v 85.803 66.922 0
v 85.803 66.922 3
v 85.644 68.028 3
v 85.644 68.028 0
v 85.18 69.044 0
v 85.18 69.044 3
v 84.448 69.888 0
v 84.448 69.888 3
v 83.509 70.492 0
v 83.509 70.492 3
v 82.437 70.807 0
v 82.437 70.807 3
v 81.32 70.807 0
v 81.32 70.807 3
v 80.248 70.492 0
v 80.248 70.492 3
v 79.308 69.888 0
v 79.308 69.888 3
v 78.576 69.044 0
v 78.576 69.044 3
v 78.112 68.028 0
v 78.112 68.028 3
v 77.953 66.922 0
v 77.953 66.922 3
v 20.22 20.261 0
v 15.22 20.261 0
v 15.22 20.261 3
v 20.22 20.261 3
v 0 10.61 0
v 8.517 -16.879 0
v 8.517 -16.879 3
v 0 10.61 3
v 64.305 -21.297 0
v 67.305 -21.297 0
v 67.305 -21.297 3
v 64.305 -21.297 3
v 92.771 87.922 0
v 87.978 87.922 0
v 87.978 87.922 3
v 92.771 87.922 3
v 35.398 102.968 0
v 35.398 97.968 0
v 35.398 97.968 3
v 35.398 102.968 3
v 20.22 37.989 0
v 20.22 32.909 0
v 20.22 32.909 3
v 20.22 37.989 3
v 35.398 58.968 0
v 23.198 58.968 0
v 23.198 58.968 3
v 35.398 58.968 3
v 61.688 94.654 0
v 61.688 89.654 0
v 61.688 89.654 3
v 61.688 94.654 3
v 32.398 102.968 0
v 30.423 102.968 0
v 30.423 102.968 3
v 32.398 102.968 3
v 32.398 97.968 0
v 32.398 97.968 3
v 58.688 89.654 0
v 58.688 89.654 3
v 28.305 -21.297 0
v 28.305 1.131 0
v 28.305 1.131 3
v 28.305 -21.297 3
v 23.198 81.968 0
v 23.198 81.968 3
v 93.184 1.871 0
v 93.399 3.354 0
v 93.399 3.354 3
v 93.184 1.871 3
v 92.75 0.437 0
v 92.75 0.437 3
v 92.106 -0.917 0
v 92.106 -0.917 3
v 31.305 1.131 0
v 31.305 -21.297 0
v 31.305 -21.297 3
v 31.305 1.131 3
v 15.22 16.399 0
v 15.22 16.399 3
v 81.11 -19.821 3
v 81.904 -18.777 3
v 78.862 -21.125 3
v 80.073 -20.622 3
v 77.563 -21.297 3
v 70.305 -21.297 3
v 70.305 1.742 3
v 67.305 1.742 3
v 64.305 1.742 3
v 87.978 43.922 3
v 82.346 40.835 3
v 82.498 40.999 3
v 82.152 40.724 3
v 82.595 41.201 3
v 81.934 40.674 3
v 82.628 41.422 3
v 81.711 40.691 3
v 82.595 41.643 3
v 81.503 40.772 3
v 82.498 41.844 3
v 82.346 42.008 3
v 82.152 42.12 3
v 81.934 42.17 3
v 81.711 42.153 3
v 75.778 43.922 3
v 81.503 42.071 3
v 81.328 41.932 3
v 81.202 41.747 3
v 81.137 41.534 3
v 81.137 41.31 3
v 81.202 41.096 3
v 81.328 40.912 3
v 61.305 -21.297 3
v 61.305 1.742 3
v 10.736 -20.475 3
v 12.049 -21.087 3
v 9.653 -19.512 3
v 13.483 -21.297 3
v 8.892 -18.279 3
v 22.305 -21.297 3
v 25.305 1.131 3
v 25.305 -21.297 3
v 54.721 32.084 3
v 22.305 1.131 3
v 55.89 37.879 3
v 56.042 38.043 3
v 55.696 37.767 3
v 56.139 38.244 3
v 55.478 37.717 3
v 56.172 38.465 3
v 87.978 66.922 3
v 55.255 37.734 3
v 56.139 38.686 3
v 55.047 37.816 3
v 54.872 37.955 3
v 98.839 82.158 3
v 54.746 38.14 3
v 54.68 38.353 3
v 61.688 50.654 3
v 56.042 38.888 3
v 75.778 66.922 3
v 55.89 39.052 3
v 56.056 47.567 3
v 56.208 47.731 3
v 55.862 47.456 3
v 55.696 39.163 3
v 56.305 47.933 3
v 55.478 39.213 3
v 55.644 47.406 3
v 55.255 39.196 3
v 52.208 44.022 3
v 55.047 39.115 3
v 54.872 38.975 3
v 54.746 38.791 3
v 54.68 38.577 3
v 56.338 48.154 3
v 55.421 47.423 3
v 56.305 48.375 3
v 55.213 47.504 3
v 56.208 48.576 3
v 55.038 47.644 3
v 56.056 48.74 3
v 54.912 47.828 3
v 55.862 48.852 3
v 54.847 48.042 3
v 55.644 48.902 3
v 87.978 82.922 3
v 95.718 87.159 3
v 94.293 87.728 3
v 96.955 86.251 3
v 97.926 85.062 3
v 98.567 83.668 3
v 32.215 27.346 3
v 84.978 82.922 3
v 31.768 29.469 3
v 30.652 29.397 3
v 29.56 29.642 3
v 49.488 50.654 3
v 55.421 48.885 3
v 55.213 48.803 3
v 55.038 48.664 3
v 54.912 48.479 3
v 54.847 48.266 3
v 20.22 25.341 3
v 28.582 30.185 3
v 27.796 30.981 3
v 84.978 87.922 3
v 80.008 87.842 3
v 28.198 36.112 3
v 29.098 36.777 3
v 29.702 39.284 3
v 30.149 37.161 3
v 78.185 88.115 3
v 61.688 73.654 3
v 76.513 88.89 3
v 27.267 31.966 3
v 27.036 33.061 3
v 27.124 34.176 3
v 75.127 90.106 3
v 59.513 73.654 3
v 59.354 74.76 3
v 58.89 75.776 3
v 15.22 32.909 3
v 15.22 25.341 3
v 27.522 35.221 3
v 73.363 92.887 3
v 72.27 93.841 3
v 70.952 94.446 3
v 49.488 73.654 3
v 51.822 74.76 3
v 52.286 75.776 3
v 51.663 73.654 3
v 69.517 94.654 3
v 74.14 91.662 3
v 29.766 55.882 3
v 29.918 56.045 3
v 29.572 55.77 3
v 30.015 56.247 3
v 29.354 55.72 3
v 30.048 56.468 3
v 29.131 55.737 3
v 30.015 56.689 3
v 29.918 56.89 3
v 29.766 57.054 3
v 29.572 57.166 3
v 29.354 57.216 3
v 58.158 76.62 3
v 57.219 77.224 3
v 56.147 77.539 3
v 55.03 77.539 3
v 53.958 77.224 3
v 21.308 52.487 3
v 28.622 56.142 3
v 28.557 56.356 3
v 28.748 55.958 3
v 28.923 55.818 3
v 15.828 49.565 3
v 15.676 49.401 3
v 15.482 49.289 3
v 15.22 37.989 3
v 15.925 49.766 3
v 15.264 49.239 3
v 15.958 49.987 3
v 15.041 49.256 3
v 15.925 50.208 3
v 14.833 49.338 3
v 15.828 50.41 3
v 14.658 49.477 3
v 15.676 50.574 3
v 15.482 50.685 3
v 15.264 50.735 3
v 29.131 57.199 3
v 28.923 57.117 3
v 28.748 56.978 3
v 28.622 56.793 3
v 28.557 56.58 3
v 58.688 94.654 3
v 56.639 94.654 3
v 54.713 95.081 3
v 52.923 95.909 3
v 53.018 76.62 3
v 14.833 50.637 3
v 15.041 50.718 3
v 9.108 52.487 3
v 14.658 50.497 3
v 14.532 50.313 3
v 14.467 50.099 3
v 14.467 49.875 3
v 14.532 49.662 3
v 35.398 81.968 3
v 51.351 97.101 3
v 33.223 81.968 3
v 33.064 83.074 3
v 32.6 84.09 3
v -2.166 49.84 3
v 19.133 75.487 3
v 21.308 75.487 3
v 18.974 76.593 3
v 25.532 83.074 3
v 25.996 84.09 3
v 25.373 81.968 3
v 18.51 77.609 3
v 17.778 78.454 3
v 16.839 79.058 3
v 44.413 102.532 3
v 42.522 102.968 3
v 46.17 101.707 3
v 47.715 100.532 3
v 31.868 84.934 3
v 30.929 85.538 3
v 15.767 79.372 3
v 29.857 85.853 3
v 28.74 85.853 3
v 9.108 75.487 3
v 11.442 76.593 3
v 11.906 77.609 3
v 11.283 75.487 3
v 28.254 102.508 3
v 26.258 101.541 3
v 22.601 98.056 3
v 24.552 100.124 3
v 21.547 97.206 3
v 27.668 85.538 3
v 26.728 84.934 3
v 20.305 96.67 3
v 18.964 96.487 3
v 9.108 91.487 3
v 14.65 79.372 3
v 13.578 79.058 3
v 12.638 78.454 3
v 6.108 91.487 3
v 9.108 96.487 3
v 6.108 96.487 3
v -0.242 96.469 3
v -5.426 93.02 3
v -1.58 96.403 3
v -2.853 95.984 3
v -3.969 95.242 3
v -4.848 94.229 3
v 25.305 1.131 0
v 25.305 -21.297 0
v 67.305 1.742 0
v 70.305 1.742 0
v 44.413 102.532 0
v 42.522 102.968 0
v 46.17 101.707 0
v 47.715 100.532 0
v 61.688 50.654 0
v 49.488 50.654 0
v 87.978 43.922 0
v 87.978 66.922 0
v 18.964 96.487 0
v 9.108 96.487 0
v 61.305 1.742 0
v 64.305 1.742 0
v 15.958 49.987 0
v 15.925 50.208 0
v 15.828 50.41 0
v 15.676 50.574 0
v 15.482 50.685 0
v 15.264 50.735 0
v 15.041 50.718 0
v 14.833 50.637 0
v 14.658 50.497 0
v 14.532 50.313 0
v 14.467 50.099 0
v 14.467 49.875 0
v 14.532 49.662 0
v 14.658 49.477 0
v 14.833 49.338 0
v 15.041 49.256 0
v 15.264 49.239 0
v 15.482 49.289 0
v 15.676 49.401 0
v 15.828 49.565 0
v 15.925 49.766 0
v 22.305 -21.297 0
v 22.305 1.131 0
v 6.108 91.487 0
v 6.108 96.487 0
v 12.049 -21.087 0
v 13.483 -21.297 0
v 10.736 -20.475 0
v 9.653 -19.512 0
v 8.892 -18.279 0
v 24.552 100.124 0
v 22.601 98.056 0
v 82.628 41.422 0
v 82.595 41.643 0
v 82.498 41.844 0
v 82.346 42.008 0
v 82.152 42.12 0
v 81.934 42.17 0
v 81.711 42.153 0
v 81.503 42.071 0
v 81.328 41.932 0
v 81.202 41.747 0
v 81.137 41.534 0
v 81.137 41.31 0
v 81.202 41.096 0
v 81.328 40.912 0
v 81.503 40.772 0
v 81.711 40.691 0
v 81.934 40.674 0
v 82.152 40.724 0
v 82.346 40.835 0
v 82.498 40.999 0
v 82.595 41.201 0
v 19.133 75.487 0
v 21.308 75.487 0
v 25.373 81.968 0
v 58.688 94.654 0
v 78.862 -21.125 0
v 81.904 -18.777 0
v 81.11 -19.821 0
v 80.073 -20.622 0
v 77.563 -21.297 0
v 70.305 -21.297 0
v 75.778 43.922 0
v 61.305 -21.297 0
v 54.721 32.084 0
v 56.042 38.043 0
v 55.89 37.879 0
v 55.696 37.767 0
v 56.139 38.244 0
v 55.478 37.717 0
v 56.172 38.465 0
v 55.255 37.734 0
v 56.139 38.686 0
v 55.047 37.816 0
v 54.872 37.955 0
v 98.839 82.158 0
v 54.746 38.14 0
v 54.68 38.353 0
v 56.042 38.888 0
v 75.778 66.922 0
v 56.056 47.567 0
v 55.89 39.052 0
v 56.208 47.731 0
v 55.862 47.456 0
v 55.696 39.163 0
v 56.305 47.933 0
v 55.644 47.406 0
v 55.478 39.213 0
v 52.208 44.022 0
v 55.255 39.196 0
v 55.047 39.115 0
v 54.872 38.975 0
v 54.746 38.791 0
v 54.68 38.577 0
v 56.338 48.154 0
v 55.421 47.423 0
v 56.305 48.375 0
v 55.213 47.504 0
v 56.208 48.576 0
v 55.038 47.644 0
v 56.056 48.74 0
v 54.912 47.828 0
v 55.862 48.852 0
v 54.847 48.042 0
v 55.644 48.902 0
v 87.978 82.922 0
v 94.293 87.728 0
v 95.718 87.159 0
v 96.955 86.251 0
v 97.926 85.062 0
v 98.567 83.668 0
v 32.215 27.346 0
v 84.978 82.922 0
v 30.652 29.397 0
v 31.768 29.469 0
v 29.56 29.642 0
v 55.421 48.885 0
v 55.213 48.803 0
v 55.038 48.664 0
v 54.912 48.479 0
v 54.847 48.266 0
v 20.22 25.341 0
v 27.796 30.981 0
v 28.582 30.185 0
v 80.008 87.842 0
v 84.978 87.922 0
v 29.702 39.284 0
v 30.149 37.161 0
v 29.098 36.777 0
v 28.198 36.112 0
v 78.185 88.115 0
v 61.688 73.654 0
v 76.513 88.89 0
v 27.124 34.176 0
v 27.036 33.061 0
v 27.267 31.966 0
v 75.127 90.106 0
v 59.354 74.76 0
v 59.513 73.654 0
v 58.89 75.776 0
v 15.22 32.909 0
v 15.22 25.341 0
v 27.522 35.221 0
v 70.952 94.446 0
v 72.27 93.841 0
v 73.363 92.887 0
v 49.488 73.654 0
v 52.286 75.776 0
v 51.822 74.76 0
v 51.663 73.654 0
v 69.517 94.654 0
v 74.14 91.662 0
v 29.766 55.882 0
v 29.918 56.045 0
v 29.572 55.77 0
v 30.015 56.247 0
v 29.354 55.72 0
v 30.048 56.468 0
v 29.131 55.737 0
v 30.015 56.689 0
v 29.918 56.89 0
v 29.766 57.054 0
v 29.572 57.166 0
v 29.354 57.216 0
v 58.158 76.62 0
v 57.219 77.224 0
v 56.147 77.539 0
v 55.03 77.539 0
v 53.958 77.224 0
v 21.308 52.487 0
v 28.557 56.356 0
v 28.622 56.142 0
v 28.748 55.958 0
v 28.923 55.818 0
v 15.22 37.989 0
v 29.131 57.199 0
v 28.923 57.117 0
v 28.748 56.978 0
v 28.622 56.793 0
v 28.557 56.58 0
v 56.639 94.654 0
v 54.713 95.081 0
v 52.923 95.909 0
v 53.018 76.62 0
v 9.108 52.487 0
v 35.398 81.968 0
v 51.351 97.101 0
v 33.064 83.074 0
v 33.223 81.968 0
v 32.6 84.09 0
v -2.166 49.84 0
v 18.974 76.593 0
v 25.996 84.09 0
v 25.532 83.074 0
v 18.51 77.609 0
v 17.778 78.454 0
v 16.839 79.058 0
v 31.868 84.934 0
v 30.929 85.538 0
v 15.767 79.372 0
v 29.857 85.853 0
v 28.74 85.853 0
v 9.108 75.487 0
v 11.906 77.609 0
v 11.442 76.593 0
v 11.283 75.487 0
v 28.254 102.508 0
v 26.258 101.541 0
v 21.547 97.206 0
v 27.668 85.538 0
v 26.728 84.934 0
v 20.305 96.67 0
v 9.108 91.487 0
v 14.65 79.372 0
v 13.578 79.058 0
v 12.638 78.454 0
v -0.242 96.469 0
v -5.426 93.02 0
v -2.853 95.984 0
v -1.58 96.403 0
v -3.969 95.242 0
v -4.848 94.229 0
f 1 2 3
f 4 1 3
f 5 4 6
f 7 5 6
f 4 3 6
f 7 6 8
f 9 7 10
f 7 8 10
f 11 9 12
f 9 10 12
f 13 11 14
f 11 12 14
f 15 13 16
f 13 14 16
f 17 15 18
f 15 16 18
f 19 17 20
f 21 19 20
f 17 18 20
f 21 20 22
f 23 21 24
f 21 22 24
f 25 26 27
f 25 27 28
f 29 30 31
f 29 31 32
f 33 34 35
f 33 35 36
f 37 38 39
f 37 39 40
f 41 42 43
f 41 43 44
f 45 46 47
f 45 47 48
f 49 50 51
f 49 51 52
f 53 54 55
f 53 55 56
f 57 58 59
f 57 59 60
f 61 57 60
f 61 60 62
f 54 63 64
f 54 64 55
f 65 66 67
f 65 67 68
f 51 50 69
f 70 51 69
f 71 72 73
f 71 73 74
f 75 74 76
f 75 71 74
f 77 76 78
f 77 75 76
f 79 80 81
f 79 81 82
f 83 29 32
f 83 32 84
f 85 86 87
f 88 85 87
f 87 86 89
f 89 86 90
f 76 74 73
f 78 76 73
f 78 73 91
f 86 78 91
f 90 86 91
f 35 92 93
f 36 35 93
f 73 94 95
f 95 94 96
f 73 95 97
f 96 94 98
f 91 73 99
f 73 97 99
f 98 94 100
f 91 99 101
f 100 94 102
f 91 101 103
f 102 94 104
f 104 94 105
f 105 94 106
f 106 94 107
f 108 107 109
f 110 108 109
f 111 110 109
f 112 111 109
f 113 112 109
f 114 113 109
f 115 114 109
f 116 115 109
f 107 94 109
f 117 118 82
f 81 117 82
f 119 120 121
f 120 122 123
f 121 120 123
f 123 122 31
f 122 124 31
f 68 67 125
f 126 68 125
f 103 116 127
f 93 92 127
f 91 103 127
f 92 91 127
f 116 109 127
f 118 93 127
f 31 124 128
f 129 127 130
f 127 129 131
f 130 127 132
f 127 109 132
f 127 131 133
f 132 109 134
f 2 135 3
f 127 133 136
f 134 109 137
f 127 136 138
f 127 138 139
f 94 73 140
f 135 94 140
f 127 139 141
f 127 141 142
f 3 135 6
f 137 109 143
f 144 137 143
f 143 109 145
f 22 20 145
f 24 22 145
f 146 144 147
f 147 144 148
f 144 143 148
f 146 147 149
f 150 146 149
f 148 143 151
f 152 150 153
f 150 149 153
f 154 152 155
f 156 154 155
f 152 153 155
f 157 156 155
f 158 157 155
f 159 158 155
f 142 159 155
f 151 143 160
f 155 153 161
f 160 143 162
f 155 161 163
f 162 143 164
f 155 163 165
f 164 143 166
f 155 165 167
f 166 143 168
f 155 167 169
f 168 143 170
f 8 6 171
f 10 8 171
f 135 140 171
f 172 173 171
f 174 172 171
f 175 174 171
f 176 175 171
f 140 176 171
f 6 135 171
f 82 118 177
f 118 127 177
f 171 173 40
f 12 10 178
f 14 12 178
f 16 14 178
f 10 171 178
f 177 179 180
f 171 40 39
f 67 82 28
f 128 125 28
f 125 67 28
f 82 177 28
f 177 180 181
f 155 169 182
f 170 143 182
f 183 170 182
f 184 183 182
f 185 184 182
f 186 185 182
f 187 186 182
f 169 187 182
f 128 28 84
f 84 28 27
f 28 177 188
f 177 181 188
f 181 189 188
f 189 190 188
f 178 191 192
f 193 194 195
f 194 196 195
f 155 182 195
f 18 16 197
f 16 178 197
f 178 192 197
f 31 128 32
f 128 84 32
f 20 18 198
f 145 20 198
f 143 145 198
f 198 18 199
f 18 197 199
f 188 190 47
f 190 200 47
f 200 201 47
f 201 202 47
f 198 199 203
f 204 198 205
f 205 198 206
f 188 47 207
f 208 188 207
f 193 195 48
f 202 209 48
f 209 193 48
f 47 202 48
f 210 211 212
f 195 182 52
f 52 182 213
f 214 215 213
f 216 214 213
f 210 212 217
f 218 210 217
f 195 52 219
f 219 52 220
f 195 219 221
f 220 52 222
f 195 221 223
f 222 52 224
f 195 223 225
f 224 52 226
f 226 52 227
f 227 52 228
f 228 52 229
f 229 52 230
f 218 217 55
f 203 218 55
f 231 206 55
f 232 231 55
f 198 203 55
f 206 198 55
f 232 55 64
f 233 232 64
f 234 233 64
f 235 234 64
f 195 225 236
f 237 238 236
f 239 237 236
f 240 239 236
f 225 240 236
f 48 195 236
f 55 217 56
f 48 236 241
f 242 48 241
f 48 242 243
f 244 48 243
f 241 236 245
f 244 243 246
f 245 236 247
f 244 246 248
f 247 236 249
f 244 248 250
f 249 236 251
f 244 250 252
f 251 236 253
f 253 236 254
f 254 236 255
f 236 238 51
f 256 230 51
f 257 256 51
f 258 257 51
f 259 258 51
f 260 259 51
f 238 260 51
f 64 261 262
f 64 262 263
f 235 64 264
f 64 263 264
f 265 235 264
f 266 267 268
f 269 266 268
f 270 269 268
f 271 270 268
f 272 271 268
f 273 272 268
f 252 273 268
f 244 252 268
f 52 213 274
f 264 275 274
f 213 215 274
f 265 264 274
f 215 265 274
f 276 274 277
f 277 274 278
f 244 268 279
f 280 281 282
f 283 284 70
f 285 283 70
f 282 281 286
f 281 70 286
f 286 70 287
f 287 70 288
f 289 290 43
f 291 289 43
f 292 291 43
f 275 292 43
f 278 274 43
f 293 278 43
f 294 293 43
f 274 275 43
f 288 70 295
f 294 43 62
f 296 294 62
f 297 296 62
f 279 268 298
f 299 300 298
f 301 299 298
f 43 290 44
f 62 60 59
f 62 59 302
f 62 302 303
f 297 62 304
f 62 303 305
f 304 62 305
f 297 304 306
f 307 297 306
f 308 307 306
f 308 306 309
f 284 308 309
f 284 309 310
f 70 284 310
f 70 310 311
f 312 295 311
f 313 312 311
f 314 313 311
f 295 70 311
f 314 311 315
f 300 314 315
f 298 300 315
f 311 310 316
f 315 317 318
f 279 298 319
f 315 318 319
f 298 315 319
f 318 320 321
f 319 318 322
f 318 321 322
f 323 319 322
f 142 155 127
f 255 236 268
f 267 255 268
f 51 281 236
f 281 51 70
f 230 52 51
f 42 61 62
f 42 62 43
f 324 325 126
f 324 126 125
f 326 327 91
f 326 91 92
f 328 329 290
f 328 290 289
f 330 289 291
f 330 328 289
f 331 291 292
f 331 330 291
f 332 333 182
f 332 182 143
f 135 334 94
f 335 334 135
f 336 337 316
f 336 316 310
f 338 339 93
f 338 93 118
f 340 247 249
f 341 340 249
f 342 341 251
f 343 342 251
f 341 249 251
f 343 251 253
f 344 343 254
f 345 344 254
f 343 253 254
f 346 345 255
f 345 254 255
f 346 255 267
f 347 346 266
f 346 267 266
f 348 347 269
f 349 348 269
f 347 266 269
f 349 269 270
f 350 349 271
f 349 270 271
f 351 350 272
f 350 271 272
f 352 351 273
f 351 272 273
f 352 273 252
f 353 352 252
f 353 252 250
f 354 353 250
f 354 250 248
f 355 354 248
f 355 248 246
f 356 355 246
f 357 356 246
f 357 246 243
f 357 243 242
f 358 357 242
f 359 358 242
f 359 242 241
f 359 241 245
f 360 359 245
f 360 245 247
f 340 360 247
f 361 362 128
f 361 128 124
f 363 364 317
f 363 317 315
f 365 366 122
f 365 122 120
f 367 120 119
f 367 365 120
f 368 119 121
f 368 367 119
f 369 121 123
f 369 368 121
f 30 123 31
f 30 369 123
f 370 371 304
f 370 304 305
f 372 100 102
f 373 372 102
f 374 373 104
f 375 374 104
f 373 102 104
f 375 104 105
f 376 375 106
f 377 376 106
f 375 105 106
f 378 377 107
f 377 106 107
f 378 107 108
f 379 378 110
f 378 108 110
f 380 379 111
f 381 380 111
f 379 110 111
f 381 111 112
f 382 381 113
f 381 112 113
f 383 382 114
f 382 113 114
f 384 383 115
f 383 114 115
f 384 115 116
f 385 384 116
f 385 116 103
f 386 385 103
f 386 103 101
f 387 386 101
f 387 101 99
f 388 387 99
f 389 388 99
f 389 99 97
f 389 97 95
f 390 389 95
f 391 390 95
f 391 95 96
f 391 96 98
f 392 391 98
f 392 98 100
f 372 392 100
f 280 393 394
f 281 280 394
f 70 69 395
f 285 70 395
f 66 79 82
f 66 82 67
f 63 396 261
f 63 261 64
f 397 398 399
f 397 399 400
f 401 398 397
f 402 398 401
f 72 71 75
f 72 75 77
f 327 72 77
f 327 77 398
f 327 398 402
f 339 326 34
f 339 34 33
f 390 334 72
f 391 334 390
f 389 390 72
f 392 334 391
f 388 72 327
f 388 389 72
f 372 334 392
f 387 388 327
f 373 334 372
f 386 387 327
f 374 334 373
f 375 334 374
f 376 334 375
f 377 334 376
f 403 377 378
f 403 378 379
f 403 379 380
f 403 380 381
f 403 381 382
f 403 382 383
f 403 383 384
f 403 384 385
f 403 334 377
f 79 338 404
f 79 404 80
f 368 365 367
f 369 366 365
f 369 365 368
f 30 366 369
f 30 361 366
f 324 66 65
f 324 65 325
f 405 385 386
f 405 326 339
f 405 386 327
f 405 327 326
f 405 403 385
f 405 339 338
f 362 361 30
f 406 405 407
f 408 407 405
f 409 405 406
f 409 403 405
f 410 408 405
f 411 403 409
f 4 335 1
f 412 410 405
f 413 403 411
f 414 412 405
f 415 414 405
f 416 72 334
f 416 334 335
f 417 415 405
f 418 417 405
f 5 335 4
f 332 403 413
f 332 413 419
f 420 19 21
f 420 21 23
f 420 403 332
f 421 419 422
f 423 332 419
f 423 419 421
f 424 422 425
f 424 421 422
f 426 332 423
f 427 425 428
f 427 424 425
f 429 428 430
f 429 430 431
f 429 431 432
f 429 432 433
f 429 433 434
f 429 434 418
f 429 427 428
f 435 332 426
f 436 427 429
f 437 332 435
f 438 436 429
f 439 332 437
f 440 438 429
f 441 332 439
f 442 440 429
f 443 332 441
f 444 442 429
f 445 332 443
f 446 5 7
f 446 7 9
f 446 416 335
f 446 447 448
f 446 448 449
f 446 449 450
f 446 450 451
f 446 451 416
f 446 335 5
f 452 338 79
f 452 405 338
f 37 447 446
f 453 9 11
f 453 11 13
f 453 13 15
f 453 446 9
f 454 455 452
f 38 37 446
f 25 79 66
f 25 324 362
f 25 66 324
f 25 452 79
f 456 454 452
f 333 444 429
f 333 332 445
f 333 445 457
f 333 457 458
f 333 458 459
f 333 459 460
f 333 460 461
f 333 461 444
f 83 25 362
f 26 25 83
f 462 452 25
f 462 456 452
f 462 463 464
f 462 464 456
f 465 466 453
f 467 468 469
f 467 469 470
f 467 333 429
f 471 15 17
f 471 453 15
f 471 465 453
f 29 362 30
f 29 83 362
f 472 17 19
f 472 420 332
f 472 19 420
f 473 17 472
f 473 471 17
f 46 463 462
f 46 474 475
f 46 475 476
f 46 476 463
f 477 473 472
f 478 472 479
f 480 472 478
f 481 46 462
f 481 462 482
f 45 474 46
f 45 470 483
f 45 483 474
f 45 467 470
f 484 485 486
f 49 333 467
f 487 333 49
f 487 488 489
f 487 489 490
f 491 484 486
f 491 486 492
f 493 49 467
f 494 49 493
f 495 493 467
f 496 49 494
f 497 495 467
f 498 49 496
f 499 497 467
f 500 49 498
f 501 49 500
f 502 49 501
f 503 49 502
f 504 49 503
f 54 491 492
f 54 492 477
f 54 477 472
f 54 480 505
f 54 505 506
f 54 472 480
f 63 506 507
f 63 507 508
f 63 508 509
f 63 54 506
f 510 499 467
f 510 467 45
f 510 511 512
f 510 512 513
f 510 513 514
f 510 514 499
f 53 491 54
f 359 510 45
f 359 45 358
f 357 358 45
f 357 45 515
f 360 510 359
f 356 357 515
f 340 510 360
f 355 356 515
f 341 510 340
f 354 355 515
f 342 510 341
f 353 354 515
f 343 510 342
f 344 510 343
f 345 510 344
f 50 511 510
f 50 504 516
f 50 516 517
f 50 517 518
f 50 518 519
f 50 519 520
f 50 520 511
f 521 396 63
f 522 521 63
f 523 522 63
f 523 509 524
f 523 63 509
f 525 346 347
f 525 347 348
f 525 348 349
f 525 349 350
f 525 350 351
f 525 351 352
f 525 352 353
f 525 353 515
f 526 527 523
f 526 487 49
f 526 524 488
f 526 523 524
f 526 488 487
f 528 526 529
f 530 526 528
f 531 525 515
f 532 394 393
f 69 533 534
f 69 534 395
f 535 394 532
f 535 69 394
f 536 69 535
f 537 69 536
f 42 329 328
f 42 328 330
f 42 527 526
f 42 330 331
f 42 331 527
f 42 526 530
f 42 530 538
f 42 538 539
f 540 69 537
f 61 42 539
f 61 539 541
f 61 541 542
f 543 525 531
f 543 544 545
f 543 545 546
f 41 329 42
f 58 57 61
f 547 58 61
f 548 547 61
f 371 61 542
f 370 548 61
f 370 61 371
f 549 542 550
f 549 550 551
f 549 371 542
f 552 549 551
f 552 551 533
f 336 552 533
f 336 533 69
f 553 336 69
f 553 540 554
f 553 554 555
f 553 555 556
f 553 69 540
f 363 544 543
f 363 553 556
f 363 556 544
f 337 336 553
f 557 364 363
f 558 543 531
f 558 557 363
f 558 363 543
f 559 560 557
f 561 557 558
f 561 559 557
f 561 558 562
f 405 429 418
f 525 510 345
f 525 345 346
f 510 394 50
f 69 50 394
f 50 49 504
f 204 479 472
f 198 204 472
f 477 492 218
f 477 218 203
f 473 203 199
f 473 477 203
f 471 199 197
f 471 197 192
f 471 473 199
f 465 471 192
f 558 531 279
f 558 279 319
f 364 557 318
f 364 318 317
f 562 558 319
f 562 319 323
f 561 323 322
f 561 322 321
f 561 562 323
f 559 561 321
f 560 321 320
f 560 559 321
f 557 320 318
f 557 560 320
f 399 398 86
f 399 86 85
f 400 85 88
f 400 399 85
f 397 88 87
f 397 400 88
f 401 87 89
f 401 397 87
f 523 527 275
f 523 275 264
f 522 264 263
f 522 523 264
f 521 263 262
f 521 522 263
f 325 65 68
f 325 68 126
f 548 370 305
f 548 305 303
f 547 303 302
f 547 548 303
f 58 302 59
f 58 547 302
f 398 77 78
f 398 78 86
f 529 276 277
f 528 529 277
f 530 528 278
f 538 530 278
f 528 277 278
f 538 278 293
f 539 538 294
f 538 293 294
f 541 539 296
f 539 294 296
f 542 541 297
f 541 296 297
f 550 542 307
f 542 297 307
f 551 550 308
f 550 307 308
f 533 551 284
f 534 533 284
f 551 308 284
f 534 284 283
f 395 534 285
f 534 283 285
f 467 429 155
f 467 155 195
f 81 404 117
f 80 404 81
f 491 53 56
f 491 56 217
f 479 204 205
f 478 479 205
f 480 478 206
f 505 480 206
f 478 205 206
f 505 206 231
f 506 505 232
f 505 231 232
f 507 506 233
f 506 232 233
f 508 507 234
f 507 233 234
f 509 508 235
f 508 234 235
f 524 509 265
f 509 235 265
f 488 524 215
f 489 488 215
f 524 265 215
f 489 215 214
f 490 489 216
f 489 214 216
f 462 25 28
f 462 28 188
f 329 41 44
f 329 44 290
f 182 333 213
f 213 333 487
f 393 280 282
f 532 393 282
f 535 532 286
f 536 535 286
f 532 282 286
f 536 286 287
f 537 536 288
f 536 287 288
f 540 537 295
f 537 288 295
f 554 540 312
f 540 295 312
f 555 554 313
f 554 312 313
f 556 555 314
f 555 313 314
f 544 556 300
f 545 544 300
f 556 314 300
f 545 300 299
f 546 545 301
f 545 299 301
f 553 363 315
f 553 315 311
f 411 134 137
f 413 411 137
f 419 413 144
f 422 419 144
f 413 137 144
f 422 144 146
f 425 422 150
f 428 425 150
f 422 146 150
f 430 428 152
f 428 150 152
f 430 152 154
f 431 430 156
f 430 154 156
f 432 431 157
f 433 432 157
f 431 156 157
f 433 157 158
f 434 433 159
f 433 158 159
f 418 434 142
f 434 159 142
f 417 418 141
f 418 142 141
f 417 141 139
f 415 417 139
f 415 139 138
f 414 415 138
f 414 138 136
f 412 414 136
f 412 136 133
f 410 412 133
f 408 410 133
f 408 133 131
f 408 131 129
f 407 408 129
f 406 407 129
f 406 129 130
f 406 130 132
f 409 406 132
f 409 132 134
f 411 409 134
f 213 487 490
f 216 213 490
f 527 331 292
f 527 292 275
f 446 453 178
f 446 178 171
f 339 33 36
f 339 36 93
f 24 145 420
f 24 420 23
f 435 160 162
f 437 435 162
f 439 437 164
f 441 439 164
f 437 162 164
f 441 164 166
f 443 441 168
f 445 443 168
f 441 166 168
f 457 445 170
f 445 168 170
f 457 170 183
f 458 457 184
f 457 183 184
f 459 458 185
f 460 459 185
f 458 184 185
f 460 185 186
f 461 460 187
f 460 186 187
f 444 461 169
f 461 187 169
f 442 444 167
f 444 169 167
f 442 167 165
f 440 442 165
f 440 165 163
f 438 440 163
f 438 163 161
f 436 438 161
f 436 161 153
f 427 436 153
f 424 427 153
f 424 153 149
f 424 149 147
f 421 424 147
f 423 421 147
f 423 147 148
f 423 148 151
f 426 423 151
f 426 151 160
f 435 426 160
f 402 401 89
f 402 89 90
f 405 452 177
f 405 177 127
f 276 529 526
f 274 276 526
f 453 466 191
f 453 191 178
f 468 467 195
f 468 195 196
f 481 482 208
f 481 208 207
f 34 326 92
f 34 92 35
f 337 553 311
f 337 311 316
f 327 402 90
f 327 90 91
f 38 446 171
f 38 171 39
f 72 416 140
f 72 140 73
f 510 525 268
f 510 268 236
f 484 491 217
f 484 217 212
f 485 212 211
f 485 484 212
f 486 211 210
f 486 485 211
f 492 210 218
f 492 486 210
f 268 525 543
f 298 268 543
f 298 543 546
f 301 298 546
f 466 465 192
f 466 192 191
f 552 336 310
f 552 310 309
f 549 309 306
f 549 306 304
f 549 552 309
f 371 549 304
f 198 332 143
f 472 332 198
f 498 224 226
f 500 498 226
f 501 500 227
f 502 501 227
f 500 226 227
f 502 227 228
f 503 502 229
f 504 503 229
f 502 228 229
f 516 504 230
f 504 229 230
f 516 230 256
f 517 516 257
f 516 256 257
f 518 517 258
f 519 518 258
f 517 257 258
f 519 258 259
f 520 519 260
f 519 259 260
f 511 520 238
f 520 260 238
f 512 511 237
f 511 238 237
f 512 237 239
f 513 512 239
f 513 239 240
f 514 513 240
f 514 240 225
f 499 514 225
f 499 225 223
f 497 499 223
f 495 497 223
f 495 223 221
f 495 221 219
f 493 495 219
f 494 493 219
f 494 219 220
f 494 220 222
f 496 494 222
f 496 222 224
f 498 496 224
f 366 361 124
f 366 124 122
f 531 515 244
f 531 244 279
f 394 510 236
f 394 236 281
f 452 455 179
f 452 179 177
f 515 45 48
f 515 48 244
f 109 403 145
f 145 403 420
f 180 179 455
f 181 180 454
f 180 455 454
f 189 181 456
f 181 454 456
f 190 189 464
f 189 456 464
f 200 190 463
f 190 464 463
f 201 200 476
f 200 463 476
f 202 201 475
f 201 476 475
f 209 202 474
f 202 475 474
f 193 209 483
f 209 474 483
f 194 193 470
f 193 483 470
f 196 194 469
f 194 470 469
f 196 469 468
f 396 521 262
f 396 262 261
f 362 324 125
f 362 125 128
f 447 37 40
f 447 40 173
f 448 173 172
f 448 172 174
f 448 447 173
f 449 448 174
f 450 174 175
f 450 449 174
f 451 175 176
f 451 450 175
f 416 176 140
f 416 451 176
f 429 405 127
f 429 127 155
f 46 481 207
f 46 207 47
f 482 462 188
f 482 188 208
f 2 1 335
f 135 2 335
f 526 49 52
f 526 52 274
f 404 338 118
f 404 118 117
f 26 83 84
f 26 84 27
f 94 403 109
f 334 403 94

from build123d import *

# Parameters (mm, degrees)
SKETCH1_W           = 12.2
SKETCH1_H           = 23
BOSS_EXTRUDE1_DEPTH = 3
CUT_EXTRUDE2_DEPTH  = 4
SKETCH5_R           = 3.925
CUT_EXTRUDE3_DEPTH  = 4
SKETCH6_R           = 0.75
CUT_EXTRUDE4_DEPTH  = 4
SKETCH7_R           = 3.93
SKETCH7_R_2         = 0.75
CUT_EXTRUDE5_DEPTH  = 4
SKETCH8_R           = 0.75
CUT_EXTRUDE6_DEPTH  = 4


with BuildPart() as part:
    # Sketch1 → Boss-Extrude1 (new body)
    with BuildSketch(Plane.XY):
        with BuildLine():
            Line((22.600652844, 98.055778181), (24.552064, 100.123868682))
            ThreePointArc((24.552064, 100.123868682), (27.226414403, 102.085102355), (30.423169177, 102.967908395))
            Line((30.423169177, 102.967908395), (32.3981368, 102.967908395))
            Line((32.3981368, 102.967908395), (32.3981368, 97.967908395))
            Line((32.3981368, 97.967908395), (35.3981368, 97.967908395))
            Line((35.3981368, 97.967908395), (35.3981368, 102.967908395))
            Line((35.3981368, 102.967908395), (42.521983007, 102.967908395))
            ThreePointArc((42.521983007, 102.967908395), (45.313446231, 102.166024258), (47.714614303, 100.532109635))
            Line((47.714614303, 100.532109635), (51.351246918, 97.100651749))
            ThreePointArc((51.351246918, 97.100651749), (53.795711755, 95.446564433), (56.638770897, 94.65382999))
            Line((56.638770897, 94.65382999), (58.6881368, 94.65382999))
            Line((58.6881368, 94.65382999), (58.6881368, 89.65382999))
            Line((58.6881368, 89.65382999), (61.6881368, 89.65382999))
            Line((61.6881368, 89.65382999), (61.6881368, 94.65382999))
            Line((61.6881368, 94.65382999), (69.516671711, 94.65382999))
            ThreePointArc((69.516671711, 94.65382999), (72.270221934, 93.840698694), (74.140331494, 91.662187375))
            ThreePointArc((74.140331494, 91.662187375), (76.513167022, 88.89023599), (80.008265046, 87.842212737))
            Line((80.008265046, 87.842212737), (84.9781368, 87.921834161))
            Line((84.9781368, 87.921834161), (84.9781368, 82.921834161))
            Line((84.9781368, 82.921834161), (87.9781368, 82.921834161))
            Line((87.9781368, 82.921834161), (87.9781368, 87.921834161))
            Line((87.9781368, 87.921834161), (92.770707207, 87.921834161))
            ThreePointArc((92.770707207, 87.921834161), (96.955459046, 86.251143727), (98.839013483, 82.157786039))
            Line((98.839013483, 82.157786039), (93.399435569, 3.354416739))
            ThreePointArc((93.399435569, 3.354416739), (92.994237185, 1.145679097), (92.106398089, -0.916952583))
            Line((92.106398089, -0.916952583), (81.904303792, -18.77723742))
            ThreePointArc((81.904303792, -18.77723742), (80.072671375, -20.621586038), (77.562692027, -21.297235952))
            Line((77.562692027, -21.297235952), (70.304838359, -21.297235952))
            Line((70.304838359, -21.297235952), (70.304838359, 1.741579383))
            Line((70.304838359, 1.741579383), (67.304838359, 1.741579383))
            Line((67.304838359, 1.741579383), (67.304838359, -21.297235952))
            Line((67.304838359, -21.297235952), (64.304838359, -21.297235952))
            Line((64.304838359, -21.297235952), (64.304838359, 1.741579383))
            Line((64.304838359, 1.741579383), (61.304838359, 1.741579383))
            Line((61.304838359, 1.741579383), (61.304838359, -21.297235952))
            Line((61.304838359, -21.297235952), (31.304838359, -21.297235952))
            Line((31.304838359, -21.297235952), (31.304838359, 1.130887015))
            Line((31.304838359, 1.130887015), (28.304838359, 1.130887015))
            Line((28.304838359, 1.130887015), (28.304838359, -21.297235952))
            Line((28.304838359, -21.297235952), (25.304838359, -21.297235952))
            Line((25.304838359, -21.297235952), (25.304838359, 1.130887015))
            Line((25.304838359, 1.130887015), (22.304838359, 1.130887015))
            Line((22.304838359, 1.130887015), (22.304838359, -21.297235952))
            Line((22.304838359, -21.297235952), (13.483047429, -21.297235952))
            ThreePointArc((13.483047429, -21.297235952), (10.159531289, -20.032773458), (8.51699975, -16.878932137))
            Line((8.51699975, -16.878932137), (0, 10.609645279))
            Line((0, 10.609645279), (15.219519397, 16.399351506))
            Line((15.219519397, 16.399351506), (15.219519397, 20.261157087))
            Line((15.219519397, 20.261157087), (20.219519397, 20.261157087))
            Line((20.219519397, 20.261157087), (20.219519397, 25.341157087))
            Line((20.219519397, 25.341157087), (15.219519397, 25.341157087))
            Line((15.219519397, 25.341157087), (15.219519397, 32.909351506))
            Line((15.219519397, 32.909351506), (20.219519397, 32.909351506))
            Line((20.219519397, 32.909351506), (20.219519397, 37.989351506))
            Line((20.219519397, 37.989351506), (15.219519397, 37.989351506))
            Line((15.219519397, 37.989351506), (-2.165979283, 49.840454802))
            Line((-2.165979283, 49.840454802), (-5.425944103, 93.020454802))
            ThreePointArc((-5.425944103, 93.020454802), (-3.436216957, 95.650222165), (-0.241837421, 96.469142112))
            Line((-0.241837421, 96.469142112), (6.1081368, 96.487236066))
            Line((6.1081368, 96.487236066), (6.1081368, 91.487236066))
            Line((6.1081368, 91.487236066), (9.1081368, 91.487236066))
            Line((9.1081368, 91.487236066), (9.1081368, 96.487236066))
            Line((9.1081368, 96.487236066), (18.964020228, 96.487236066))
            ThreePointArc((18.964020228, 96.487236066), (20.944261448, 96.896087548), (22.600652844, 98.055778181))
        make_face()
        with Locations((81.8781368, 55.421834161)):
            Rectangle(SKETCH1_W, SKETCH1_H, mode=Mode.SUBTRACT)
        with Locations((55.5881368, 62.15382999)):
            Rectangle(SKETCH1_W, SKETCH1_H, mode=Mode.SUBTRACT)
        with Locations((29.2981368, 70.467908395)):
            Rectangle(SKETCH1_W, SKETCH1_H, mode=Mode.SUBTRACT)
        with Locations((15.2081368, 63.987236066)):
            Rectangle(SKETCH1_W, SKETCH1_H, mode=Mode.SUBTRACT)
    extrude(amount=BOSS_EXTRUDE1_DEPTH)

    # Sketch4 → Cut-Extrude2 (cut, through all)
    with BuildSketch(Plane(origin=(0, 0, 0), x_dir=(-1, 0, 0), z_dir=(0, 0, -1))):
        Polygon((-52.208167191, 44.022304868), (-29.701522137, 39.284063804), (-32.214850005, 27.345756427), (-54.72149506, 32.083997491), align=None)
    extrude(amount=-CUT_EXTRUDE2_DEPTH, mode=Mode.SUBTRACT)

    # Sketch5 → Cut-Extrude3 (cut, through all)
    with BuildSketch(Plane.XY.offset(3)):
        with Locations((15.2081368, 75.487236066)):
            Circle(SKETCH5_R)
        with Locations((29.2981368, 81.967908395)):
            Circle(SKETCH5_R)
        with Locations((55.5881368, 73.65382999)):
            Circle(SKETCH5_R)
        with Locations((81.8781368, 66.921834161)):
            Circle(SKETCH5_R)
    extrude(amount=-CUT_EXTRUDE3_DEPTH, mode=Mode.SUBTRACT)

    # Sketch6 → Cut-Extrude4 (cut, through all)
    with BuildSketch(Plane.XY.offset(3)):
        with Locations((15.2081368, 49.987236066)):
            Circle(SKETCH6_R)
        with Locations((29.2981368, 56.467908395)):
            Circle(SKETCH6_R)
        with Locations((55.5881368, 48.15382999)):
            Circle(SKETCH6_R)
        with Locations((81.8781368, 41.421834161)):
            Circle(SKETCH6_R)
    extrude(amount=-CUT_EXTRUDE4_DEPTH, mode=Mode.SUBTRACT)

    # Sketch7 → Cut-Extrude5 (cut, through all)
    with BuildSketch(Plane(origin=(0, 0, 0), x_dir=(-1, 0, 0), z_dir=(0, 0, -1))):
        with Locations((-30.958186071, 33.314910116)):
            Circle(SKETCH7_R)
        with Locations((-52.760024114, 36.18145487)):
            Circle(SKETCH7_R_2)
    extrude(amount=-CUT_EXTRUDE5_DEPTH, mode=Mode.SUBTRACT)

    # Sketch8 → Cut-Extrude6 (cut, through all)
    with BuildSketch(Plane.XY.offset(3)):
        with Locations((55.421930696, 38.465172142)):
            Circle(SKETCH8_R)
    extrude(amount=-CUT_EXTRUDE6_DEPTH, mode=Mode.SUBTRACT)


solid = part.part
